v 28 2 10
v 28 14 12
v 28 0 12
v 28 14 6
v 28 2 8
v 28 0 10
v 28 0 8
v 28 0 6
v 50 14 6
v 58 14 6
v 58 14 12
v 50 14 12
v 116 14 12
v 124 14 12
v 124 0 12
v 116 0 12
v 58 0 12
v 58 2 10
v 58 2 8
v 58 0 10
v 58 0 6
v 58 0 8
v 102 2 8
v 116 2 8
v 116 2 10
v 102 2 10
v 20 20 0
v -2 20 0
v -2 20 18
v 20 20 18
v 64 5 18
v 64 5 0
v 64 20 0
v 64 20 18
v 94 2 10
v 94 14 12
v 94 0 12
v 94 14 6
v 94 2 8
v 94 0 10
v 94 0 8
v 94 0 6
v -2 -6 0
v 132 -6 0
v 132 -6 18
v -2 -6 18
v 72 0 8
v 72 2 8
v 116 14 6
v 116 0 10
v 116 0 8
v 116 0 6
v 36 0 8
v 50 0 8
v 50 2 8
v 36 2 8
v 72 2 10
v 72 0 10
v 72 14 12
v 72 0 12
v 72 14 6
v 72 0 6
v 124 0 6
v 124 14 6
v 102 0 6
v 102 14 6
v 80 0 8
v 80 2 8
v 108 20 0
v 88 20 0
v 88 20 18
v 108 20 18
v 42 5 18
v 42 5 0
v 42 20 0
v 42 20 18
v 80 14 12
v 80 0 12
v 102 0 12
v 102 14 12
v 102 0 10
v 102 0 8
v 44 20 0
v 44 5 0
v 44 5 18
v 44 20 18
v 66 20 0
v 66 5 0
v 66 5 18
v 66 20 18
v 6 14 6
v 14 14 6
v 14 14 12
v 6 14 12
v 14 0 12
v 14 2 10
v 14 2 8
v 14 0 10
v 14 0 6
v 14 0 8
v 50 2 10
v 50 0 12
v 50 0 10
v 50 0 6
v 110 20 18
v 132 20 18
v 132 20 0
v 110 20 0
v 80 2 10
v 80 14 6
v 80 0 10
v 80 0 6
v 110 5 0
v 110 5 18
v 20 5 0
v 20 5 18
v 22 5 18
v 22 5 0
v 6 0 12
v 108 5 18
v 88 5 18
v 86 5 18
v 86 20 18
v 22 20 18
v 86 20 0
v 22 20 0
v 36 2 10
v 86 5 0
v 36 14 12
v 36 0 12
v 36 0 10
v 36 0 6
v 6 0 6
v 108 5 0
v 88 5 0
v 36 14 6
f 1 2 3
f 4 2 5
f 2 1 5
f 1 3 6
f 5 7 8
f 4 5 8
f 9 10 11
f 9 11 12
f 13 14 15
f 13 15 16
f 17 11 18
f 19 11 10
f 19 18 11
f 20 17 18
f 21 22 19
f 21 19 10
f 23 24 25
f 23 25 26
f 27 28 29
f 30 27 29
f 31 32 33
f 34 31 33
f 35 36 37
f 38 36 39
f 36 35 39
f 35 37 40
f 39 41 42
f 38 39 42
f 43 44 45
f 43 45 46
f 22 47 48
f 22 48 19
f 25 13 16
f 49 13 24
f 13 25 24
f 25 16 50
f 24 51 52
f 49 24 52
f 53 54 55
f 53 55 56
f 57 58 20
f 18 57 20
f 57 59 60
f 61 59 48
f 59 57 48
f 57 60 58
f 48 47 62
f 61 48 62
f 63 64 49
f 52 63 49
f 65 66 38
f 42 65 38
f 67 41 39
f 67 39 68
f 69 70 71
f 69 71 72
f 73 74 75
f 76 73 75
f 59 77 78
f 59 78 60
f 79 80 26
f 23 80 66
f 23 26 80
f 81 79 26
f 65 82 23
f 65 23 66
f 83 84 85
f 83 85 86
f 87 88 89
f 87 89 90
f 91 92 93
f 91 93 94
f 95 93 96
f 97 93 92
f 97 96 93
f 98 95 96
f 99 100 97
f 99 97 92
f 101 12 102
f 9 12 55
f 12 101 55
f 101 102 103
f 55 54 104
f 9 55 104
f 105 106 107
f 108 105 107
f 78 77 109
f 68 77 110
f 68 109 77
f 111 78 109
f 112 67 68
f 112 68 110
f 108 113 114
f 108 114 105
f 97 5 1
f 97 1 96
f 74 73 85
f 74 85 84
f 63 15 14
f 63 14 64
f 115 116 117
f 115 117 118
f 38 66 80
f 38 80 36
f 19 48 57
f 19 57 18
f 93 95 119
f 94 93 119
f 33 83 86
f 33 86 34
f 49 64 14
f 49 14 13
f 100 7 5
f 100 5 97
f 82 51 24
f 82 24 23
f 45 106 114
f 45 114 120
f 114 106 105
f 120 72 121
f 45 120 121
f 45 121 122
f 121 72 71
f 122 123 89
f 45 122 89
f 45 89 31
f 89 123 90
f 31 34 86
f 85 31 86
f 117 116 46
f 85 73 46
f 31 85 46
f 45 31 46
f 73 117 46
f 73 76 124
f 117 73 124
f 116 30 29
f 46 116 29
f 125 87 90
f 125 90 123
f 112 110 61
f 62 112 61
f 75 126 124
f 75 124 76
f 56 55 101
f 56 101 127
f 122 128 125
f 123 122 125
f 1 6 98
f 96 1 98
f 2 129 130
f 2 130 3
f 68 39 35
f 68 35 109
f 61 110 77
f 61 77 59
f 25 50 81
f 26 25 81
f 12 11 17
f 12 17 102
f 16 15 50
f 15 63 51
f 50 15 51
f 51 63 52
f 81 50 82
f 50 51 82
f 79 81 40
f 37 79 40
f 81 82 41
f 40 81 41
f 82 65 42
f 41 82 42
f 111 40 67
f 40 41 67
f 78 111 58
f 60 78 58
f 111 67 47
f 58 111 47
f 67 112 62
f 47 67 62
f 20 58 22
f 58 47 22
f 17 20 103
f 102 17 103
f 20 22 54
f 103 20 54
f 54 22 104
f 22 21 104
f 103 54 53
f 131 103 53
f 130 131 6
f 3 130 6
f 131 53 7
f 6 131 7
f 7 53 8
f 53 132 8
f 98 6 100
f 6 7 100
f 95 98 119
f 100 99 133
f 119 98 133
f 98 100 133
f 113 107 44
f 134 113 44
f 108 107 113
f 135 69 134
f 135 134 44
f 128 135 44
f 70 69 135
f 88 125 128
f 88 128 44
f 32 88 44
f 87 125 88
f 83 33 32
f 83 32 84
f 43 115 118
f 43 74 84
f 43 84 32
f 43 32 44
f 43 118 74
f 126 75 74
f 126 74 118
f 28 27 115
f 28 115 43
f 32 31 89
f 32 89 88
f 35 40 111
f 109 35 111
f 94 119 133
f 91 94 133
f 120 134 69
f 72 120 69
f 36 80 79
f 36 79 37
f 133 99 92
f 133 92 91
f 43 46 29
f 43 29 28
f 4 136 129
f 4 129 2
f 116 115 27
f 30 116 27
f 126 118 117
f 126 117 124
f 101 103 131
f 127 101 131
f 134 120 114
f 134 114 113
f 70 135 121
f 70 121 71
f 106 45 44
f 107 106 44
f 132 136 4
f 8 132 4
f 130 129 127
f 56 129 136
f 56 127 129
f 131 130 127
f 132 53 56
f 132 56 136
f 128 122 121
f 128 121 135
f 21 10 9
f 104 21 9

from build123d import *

# Parameters (mm, degrees)
SKETCH1_W           = 20
SKETCH1_H           = 20
BOSS_EXTRUDE1_DEPTH = 18
SKETCH2_W           = 8
SKETCH2_H           = 6
CUT_EXTRUDE1_DEPTH  = 14
SKETCH3_W           = 18
SKETCH3_H           = 5
BOSS_EXTRUDE2_DEPTH = 2
LPATTERN1_COUNT     = 6
LPATTERN1_PITCH     = 22
SKETCH4_W           = 18
SKETCH4_H           = 15
BOSS_EXTRUDE3_DEPTH = 2
SKETCH5_W           = 18
SKETCH5_H           = 20
BOSS_EXTRUDE4_DEPTH = 2
SKETCH6_W           = 118
SKETCH6_H           = 2
CUT_EXTRUDE2_DEPTH  = 2
SKETCH7_W           = 134
SKETCH7_H           = 18
BOSS_EXTRUDE5_DEPTH = 6


with BuildPart() as part:
    # Sketch1 → Boss-Extrude1 (new body)
    with BuildSketch(Plane.XY):
        with Locations((10, 10)):
            Rectangle(SKETCH1_W, SKETCH1_H)
    extrude(amount=BOSS_EXTRUDE1_DEPTH)

    # Sketch2 → Cut-Extrude1 (cut)
    with BuildSketch(Plane(origin=(0, 0, 0), x_dir=(-1, 0, 0), z_dir=(0, -1, 0))):
        with Locations((-10, -9)):
            Rectangle(SKETCH2_W, SKETCH2_H)
    extrude(amount=-CUT_EXTRUDE1_DEPTH, mode=Mode.SUBTRACT)

    # Sketch3 → Boss-Extrude2 (add)
    with BuildSketch(Plane(origin=(20, 0, 0), x_dir=(0, 0, -1), z_dir=(1, 0, 0))):
        with Locations((-9, 2.5)):
            Rectangle(SKETCH3_W, SKETCH3_H)
    extrude(amount=BOSS_EXTRUDE2_DEPTH)


with BuildPart() as lpattern1_1:
    # LPattern1: pattern copy
    add(part.part.moved(Location(Vector(1, 0, 0) * (1 * LPATTERN1_PITCH))))


with BuildPart() as lpattern1_2:
    # LPattern1: pattern copy
    add(part.part.moved(Location(Vector(1, 0, 0) * (2 * LPATTERN1_PITCH))))


with BuildPart() as lpattern1_3:
    # LPattern1: pattern copy
    add(part.part.moved(Location(Vector(1, 0, 0) * (3 * LPATTERN1_PITCH))))


with BuildPart() as lpattern1_4:
    # LPattern1: pattern copy
    add(part.part.moved(Location(Vector(1, 0, 0) * (4 * LPATTERN1_PITCH))))


with BuildPart() as lpattern1_5:
    # LPattern1: pattern copy
    add(part.part.moved(Location(Vector(1, 0, 0) * (5 * LPATTERN1_PITCH))))

    # Sketch4 → Boss-Extrude3 (add)
    with BuildSketch(Plane(origin=(130, 0, 0), x_dir=(0, 0, -1), z_dir=(1, 0, 0))):
        with Locations((-9, 12.5)):
            Rectangle(SKETCH4_W, SKETCH4_H)
    extrude(amount=BOSS_EXTRUDE3_DEPTH)


with BuildPart() as part_1:
    add(part.part)

    # Sketch5 → Boss-Extrude4 (add)
    with BuildSketch(Plane.ZY):
        with Locations((9, 10)):
            Rectangle(SKETCH5_W, SKETCH5_H)
    extrude(amount=BOSS_EXTRUDE4_DEPTH)


with BuildPart() as lpattern1_4_1:
    add(lpattern1_4.part)

    # Combine1: union LPattern1_5, part, LPattern1_1, LPattern1_2, LPattern1_3
    add(lpattern1_5.part)
    add(part_1.part)
    add(lpattern1_1.part)
    add(lpattern1_2.part)
    add(lpattern1_3.part)

    # Sketch6 → Cut-Extrude2 (cut)
    with BuildSketch(Plane(origin=(0, 0, 0), x_dir=(-1, 0, 0), z_dir=(0, -1, 0))):
        with Locations((-65, -9)):
            Rectangle(SKETCH6_W, SKETCH6_H)
    extrude(amount=-CUT_EXTRUDE2_DEPTH, mode=Mode.SUBTRACT)

    # Sketch7 → Boss-Extrude5 (add)
    with BuildSketch(Plane(origin=(0, 0, 0), x_dir=(-1, 0, 0), z_dir=(0, -1, 0))):
        with Locations((-65, -9)):
            Rectangle(SKETCH7_W, SKETCH7_H)
    extrude(amount=BOSS_EXTRUDE5_DEPTH)


solid = lpattern1_4_1.part
